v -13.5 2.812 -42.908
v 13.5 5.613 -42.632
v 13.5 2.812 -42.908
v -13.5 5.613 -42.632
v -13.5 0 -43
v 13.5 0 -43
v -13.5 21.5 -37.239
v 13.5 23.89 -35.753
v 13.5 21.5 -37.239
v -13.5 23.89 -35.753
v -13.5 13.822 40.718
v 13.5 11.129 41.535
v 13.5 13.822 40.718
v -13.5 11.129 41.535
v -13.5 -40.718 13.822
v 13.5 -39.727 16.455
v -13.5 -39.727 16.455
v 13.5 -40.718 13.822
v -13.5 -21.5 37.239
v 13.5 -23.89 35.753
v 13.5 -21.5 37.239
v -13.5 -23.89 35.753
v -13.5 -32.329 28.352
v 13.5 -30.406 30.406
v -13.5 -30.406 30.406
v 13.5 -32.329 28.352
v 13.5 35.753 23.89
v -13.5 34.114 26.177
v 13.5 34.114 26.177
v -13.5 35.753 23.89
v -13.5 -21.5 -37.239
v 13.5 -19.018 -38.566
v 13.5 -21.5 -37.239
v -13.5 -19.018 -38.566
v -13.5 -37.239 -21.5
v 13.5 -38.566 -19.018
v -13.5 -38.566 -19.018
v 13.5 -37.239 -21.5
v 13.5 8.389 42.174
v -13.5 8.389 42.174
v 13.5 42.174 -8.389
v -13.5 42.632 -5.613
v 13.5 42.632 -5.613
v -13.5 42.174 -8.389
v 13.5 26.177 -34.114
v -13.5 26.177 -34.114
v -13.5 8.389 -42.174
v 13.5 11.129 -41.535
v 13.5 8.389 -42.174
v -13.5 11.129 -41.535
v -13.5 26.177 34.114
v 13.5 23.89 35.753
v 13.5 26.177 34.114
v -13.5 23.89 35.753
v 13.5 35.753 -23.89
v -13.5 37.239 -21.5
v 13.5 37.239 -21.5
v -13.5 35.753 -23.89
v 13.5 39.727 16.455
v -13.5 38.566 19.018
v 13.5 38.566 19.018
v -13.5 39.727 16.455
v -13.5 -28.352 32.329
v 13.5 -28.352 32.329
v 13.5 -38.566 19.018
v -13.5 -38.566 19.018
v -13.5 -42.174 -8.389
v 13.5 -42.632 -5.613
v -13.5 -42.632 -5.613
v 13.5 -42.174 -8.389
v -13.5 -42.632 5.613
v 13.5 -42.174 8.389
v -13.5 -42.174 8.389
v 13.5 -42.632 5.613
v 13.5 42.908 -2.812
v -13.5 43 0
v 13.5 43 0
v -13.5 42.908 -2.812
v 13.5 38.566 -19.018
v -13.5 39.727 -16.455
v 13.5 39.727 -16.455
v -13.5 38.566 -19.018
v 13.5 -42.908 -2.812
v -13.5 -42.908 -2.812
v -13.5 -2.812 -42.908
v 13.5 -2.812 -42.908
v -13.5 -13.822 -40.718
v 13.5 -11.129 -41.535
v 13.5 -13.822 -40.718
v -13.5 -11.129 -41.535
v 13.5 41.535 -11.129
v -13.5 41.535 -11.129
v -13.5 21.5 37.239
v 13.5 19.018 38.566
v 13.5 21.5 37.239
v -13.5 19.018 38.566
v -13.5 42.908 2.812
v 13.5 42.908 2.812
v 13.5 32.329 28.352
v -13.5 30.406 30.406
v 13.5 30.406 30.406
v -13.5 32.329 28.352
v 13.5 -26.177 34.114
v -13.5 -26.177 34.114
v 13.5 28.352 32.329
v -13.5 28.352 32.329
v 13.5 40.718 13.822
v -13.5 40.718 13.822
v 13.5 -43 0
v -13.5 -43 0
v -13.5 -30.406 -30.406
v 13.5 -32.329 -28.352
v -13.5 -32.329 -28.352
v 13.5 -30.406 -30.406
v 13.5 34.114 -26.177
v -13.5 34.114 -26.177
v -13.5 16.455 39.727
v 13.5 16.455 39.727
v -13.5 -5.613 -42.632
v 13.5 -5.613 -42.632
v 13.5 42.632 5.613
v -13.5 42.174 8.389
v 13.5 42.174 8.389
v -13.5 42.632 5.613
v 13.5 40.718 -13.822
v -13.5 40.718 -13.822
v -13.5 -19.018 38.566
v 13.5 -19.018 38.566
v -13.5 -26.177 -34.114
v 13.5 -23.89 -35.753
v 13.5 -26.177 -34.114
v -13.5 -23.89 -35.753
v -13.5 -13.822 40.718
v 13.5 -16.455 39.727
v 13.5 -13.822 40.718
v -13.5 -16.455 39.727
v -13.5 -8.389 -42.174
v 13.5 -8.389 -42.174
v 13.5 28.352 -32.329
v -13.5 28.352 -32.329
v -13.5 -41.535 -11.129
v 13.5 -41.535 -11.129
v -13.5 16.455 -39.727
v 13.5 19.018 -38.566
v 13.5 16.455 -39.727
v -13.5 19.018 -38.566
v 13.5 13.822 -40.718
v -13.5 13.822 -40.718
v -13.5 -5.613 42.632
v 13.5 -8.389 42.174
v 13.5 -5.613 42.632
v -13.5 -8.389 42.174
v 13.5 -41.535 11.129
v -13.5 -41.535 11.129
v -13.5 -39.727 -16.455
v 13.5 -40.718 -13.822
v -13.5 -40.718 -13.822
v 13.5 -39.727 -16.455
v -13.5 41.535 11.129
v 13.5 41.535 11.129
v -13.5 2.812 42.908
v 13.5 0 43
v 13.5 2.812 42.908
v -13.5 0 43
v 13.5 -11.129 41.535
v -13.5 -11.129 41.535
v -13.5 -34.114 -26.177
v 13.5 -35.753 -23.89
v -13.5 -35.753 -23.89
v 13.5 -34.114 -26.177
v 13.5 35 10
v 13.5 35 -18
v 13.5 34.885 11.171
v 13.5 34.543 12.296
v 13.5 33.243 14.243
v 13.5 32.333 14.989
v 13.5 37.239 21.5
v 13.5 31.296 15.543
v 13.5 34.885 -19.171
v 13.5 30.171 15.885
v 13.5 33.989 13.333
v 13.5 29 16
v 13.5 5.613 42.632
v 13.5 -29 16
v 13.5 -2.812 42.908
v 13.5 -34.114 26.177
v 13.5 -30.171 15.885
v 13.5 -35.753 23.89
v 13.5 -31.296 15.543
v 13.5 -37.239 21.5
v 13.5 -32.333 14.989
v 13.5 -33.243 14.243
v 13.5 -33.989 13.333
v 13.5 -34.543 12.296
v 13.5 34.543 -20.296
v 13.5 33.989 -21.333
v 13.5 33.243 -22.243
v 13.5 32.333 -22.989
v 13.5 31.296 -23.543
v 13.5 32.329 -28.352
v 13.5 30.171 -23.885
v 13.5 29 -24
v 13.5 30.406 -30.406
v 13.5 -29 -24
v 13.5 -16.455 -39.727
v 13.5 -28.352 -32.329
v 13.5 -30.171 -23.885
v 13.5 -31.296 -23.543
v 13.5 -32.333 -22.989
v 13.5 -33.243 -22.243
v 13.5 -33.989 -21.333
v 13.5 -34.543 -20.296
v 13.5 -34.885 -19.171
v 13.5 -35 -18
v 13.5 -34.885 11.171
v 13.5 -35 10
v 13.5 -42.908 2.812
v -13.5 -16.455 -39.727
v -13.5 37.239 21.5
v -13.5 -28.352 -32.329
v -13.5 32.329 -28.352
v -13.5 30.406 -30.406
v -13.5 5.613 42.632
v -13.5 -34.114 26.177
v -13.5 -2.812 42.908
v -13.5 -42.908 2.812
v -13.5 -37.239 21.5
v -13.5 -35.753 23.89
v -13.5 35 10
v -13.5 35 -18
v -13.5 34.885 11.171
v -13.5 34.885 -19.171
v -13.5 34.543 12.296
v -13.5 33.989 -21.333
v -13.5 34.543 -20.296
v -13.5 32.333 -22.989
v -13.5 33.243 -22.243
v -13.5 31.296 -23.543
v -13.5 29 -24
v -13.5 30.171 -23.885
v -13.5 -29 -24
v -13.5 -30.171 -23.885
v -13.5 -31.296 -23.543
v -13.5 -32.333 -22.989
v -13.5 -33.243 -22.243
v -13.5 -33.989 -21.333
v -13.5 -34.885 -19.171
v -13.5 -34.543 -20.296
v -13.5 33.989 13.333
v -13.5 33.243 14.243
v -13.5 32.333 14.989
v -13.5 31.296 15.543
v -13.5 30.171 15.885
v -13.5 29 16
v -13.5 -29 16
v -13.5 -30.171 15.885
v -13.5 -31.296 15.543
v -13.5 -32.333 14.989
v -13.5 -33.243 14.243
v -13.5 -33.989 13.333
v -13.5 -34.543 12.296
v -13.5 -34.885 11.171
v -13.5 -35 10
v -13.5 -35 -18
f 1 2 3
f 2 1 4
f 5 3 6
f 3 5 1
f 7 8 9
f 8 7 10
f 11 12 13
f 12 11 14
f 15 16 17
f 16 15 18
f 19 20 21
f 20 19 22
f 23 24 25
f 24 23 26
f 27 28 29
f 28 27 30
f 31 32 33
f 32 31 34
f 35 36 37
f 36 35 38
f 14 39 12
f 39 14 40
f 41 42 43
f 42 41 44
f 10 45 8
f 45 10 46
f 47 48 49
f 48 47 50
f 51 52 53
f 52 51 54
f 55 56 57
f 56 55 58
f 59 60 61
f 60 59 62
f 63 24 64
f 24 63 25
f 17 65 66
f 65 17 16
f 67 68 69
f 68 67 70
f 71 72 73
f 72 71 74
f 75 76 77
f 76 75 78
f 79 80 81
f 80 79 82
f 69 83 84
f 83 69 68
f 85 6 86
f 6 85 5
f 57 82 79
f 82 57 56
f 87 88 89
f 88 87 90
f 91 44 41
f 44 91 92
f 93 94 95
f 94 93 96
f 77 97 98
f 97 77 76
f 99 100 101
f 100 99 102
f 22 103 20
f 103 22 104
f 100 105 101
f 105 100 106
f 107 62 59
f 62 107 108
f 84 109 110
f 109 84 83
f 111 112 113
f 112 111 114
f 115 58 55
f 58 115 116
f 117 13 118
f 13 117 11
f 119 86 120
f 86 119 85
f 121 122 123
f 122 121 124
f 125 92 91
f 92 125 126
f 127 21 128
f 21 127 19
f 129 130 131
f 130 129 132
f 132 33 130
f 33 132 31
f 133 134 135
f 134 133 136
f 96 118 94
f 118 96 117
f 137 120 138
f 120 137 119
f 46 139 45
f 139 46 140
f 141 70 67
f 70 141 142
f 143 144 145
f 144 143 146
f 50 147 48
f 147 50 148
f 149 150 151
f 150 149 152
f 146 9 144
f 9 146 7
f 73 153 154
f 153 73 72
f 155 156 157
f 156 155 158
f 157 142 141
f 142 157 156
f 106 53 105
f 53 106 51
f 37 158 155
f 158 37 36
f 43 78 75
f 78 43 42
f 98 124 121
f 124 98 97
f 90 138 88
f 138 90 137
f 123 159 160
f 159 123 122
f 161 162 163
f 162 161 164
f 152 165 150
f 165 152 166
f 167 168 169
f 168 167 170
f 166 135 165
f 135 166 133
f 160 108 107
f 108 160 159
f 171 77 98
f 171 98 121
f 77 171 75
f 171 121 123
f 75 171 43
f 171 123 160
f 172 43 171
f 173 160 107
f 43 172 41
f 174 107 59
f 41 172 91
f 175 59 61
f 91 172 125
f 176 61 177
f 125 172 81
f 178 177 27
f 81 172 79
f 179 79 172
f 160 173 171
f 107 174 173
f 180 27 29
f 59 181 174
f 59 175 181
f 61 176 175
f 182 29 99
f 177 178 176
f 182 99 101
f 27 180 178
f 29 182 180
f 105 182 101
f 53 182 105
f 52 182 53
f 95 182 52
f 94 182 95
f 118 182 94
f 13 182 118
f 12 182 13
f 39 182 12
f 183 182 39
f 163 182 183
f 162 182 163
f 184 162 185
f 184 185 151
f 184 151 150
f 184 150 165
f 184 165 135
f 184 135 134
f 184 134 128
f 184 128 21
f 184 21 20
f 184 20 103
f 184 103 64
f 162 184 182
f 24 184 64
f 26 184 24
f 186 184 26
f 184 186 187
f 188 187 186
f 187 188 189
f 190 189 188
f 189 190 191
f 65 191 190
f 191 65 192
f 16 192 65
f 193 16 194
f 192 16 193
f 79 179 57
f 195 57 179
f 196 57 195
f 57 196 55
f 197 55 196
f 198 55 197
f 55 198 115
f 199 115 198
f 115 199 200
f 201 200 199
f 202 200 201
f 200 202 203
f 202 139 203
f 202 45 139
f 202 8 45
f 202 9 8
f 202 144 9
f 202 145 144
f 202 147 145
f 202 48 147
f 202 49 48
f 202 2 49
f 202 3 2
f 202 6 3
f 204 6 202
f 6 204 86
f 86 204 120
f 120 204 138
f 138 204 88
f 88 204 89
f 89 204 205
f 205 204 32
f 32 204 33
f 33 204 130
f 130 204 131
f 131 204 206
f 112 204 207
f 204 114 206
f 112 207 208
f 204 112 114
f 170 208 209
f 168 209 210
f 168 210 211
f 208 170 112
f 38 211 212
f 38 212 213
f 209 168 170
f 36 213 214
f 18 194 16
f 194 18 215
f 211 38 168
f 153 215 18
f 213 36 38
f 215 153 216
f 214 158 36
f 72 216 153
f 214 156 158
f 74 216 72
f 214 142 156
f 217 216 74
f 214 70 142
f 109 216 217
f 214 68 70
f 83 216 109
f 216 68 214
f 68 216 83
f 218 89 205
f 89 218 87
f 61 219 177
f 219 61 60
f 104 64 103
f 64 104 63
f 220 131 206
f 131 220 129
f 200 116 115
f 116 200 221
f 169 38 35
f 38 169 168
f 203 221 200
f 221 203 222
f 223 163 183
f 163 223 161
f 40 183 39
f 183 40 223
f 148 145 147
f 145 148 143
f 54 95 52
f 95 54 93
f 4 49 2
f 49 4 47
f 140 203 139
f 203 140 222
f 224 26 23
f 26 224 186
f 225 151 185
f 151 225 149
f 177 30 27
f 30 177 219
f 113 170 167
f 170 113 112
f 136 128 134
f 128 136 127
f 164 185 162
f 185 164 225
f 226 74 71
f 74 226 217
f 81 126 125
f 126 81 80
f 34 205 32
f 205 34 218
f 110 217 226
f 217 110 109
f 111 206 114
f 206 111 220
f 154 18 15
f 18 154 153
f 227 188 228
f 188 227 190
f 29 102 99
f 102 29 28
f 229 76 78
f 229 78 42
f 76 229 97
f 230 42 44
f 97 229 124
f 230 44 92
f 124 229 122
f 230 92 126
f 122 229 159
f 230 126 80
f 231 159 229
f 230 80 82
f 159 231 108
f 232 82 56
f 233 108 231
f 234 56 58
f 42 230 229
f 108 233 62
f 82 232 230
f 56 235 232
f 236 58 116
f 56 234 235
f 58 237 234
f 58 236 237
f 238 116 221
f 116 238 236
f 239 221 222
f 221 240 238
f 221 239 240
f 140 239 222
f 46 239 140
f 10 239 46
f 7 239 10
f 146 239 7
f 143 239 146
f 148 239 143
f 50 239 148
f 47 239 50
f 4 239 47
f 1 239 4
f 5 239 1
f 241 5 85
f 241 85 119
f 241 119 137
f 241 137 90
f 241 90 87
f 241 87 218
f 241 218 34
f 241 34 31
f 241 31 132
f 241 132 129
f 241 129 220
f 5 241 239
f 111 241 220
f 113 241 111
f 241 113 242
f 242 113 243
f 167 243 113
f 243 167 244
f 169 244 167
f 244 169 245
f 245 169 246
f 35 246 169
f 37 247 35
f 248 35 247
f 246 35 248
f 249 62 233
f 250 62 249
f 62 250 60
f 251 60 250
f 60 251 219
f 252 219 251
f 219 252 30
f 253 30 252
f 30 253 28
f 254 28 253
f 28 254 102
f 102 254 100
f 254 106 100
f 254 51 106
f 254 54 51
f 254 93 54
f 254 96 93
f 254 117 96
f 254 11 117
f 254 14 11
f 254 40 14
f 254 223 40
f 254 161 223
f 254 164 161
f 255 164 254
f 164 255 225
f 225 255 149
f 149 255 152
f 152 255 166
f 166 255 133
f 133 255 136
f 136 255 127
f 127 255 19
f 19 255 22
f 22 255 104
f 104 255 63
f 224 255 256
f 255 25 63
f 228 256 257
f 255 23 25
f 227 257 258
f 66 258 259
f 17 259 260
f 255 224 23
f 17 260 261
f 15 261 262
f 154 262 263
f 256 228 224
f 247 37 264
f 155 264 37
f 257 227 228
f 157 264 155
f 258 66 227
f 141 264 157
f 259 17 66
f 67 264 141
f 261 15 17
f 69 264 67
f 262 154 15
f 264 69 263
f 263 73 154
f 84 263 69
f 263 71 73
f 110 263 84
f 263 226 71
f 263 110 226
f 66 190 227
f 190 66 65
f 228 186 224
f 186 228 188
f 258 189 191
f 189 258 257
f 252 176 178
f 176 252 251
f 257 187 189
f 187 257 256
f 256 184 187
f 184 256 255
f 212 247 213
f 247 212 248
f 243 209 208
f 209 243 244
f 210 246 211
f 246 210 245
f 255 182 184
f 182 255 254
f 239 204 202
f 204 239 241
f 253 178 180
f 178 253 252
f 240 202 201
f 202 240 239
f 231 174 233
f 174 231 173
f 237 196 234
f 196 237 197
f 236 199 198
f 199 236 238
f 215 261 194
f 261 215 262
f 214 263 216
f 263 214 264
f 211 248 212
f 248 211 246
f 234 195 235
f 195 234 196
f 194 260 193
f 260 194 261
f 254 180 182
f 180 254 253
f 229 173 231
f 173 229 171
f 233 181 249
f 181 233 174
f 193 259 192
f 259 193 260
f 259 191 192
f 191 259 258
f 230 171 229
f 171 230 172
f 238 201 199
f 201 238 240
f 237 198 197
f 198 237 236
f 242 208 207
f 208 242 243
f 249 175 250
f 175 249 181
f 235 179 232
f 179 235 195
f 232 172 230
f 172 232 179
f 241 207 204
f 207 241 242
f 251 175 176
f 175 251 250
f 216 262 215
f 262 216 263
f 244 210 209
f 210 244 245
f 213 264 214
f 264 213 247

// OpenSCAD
// file: params.scad
// SEA:CUT / Friendly Floatee drifter — shared parameters (mm)
// Hardware: CERN-OHL-S v2 (strongly reciprocal). Docs: CC BY-SA 4.0. Firmware: MIT.
// MEASURE YOUR OWN BOTTLE and edit these. Defaults approximate a 1 L round PET bottle.

// --- bottle (upcycled PET) ---
bottle_id = 90;            // bottle inner diameter
bottle_r  = bottle_id / 2; // derived inner radius

// --- printing ---
wall = 2.4;                // printed wall thickness
clr  = 0.4;                // fit clearance
$fn  = 64;                 // curve smoothness

// --- LILYGO T-A7670G board (approximate, incl. headers) ---
board_l = 68;
board_w = 34;
board_h = 12;

// --- 18650 protected cell ---
cell_d = 18.6;
cell_l = 68;

// --- lead-free ballast pocket (self-righting weight) ---
ballast_l = 55;
ballast_w = 22;

// --- flotation & hydrostatics (NEW; estimates — verify per build; see hardware/RELIABILITY.md) ---
// Sealed 1 L bottle displaces ~1000 cm^3 -> reserve ratio ~4.83x (never sinks intact).
// Real failure = seal leak -> flooded net buoyancy ~ -97 gf -> sinks. Foam reverses it.
foam_vol             = 160;   // cm^3 closed-cell foam (flooded reserve; non-BOM NEW part)
foam_density         = 0.04;  // g/cm^3 EVA/EPE estimate (range 0.03-0.05)
reserve_ratio_target = 1.25;  // flooded: (disp/mass) >= this  (PASS >= 1.20)
sealed_reserve_min   = 3.0;   // sealed: 1000cm3/mass >= this (design ~4.83)
freeboard_min        = 30;    // mm minimum calm-water freeboard
ballast_mass_g       = 40;    // tuning var; +10 g ballast needs +~11.7 cm^3 foam
// foam collar geometry (NEW part, cut/heat-formed EVA sheet — .scad is the cut master)
foam_od     = 86;             // mm, fits inside bottle_id=90 with margin
foam_bore_l = board_l + 2;    // ~70 mm payload channel (board_l=68)
foam_bore_w = board_w + 6;    // ~40 mm (board_w=34)
foam_area   = PI*pow(foam_od/2,2)/100 - (foam_bore_l*foam_bore_w)/100; // ~30.1 cm^2
foam_collar_h = foam_vol / foam_area;   // ~53 mm; split into 2 x ~27 mm
// prints: measured STL solid volume = 56.9 cm^3 (bracket 40.4 + keel 9.95 + loop 6.57)
print_infill_max = 0.60;  // keep <=60% -> foam_vol 160 holds; solid(100%) needs ~175

// --- full assembly (real size; visual mocks measure YOUR parts) ---
collar_t   = 27;          // foam collar thickness (2 pieces = foam_collar_h ~53)
collar_x   = 44.5;        // collar center offset +-X (clears keel ends at +-29.9)
bottle_body_l = 190;      // straight body length of a ~1 L bottle (mock)
bottle_body_x0 = -100;    // body from x0 to x0+bottle_body_l; neck/cap at +X
shoulder_l = 22;          // taper body -> neck
neck_l     = 18;          // neck + cap
cap_d      = 31;          // cap outer diameter

// ============================================================
//  Tier 1.5 SOLAR VARIANT — parameters (NEW; every value an ESTIMATE -> bench-verify)
//  Anchors: buoyancy=RELIABILITY §4 (density-aware) · RF=FLOAT_STANDARD B5
//           self-right "T7" = VERIFIED_BUILD_TEST T4 re-run with the solar payload installed
//  Kernels enforced here: NO new printed part · ballast 40 g UNCHANGED ·
//                         non-metal cells only · solar = power != coverage
// ------------------------------------------------------------
solar_enable = 0;          // 0 = plain Tier 1 (default). Solar build: set 1 or render -D solar_enable=1.
                           // ★SHORT-RECOVERY MISSIONS keep 0 (ELECTRONICS_POWER §3: solar = net loss).

bl_ref = board_l + 2*wall + 2*clr;                 // 73.6 (bracket len; ribs at +-bl_ref*0.35 = +-25.76)

// --- added-mass budget (★MEASURE; lens estimates diverge 20-45 g) ---
solar_added_mass_g = 39;   // PLANNING nominal (film 10-25 + ctrl 5-8 + wire 3-4 + vent ~2 + adhesive 3-8)
solar_add_rho      = 1.64; // g/cm^3 EFFECTIVE (film~1.65 · PCB~1.9 · wire~1.5 · adhesive~1.0)
solar_second_cell  = 0;    // 1 => +~56 g (48 cell + 8 mount), BELLY only, matched cells + isolation diode (F2/T7 re-pass)
solar_added_mass_eff = solar_added_mass_g + (solar_second_cell ? 56 : 0);  // effective Δm fed to foam sizing

// --- density-aware foam re-size (★NOT the ballast 11.7 cm^3/10g; panel is low-density) ---
solar_foam_coeff = (1.25 - 1/solar_add_rho)/(1 - 1.25*foam_density)*10;  // ~6.7 cm^3 / 10 g
foam_vol_solar   = foam_vol + solar_foam_coeff*(solar_added_mass_eff/10);  // ~186 cm^3 @ 39 g (2nd cell => ~224)
collar_t_solar   = foam_vol_solar/foam_area*10/2;                        // ~31 mm each (2 collars); assembly/export use this

// --- wrap bands (★NOT printed: laminated film + marine adhesive on the body) ---
solar_wrap_od = bottle_id + 2;   // body OD (MEASURE yours)
solar_wrap_r  = solar_wrap_od/2;
solar_film_t  = 0.8;             // laminated film thickness (fit/collision + RF-window viz ONLY)
solar_band_n  = 2;
solar_band_w  = 44;              // axial band width
solar_band_gap= 34;              // central channel >= recovery-loop base 30 (loop + QR stay bare)
solar_band_x  = [ for (i=[0:solar_band_n-1])
                  (solar_band_n==1) ? 0 : (i-(solar_band_n-1)/2)*(solar_band_w+solar_band_gap) ]; // +-39

// --- RF keep-out (★REAL gate = non-metal substrate; the film window is secondary insurance) ---
solar_cell_substrate = "nonmetal"; // HARD GATE: a-Si / polyimide ONLY. "metal" => ABORT (B5; verify T6)
solar_rf_x0 = -50; solar_rf_x1 = 48;  // antenna x-range (doc only; the window currently cuts the full band length)
solar_rf_deg = 120;                   // top +Z sector kept FILM-FREE (cut across the whole band = conservative)

// --- charge path (★default EXTERNAL low-Iq linear -> BATTERY terminal; NOT onboard-direct) ---
solar_ctrl_mode = "linear";  // "linear"=CN3065-class low-Iq (DEFAULT) | "mppt"=CN3791-class (clean sites)
solar_ctrl_l=26; solar_ctrl_w=19; solar_ctrl_h=7;   // COTS envelope (CG viz only), zip-tied to bracket rib
solar_ctrl_x = -bl_ref*0.35;  // -25.76 : on the -X bracket locating rib
solar_ctrl_z = -2;            // just below centreline, BESIDE the cell holder (keep CG low -> T7)

// --- low-temp cutoff (★MANDATORY on ALL modes — HARDWARE latch, not firmware) ---
solar_ntc = "10k_B3435_cell_bonded";  // JEITA: <0C stop · 0-10C taper · >45C stop (epoxy to cell can)

// --- wiring: REUSE the resealed-seam grommet (assembly §3-0) — NO NEW HOLE; re-pass T1 ---
solar_wire_od = 3.0;
// --- vent: Gore-Tex ePTFE ADHESIVE PATCH on the cap (NOT a printed boss) ---
solar_vent_patch_d = 19;

// ★HARD GATE (FLOAT_STANDARD B5) — makes the "metal => ABORT" claim TRUE in code, not just prose.
//   Any file that includes params.scad aborts if a metal-backed cell substrate is selected.
assert(solar_cell_substrate != "metal",
       "B5: metal-backed solar cells shield the antennas (RF death) + are toxic -> ABORT. Use a-Si (ETFE) or Cd-free CIGS (polyimide).");
// main file
// Friendly Floaty — foam collar (flooded-reserve primary buoyancy)
// The part that keeps a FLOODED unit afloat (RELIABILITY.md §4: 2 collars = ~160 cm^3
// closed-cell EVA/EPE -> +27.5% flooded reserve). NOT 3D-printed: this model is the
// CUT MASTER for EVA sheet stacking/heat-forming (print once as a template if useful).
// Axes: X = bottle long axis. Payload channel W70(Y) x H40(Z), centered 4 mm low so the
// bracket tray + cell holder pass through; the keel passes under via the channel.
include <params.scad>

module _rrect(w_z, w_y, r) {
    // rounded rect in the local XY plane of the rotated frame:
    // local x -> global -Z (height w_z), local y -> global Y (width w_y)
    hull() for (x = [-w_z/2 + r, w_z/2 - r]) for (y = [-w_y/2 + r, w_y/2 - r])
        translate([x, y]) circle(r = r, $fn = 32);
}

// t = collar thickness (mm). Default = base Tier-1 (collar_t=27). Solar build passes collar_t_solar (~31).
module foam_collar(t = collar_t) {
    rotate([0, 90, 0]) difference() {
        cylinder(h = t, d = foam_od, center = true, $fn = 96);
        // payload channel, centered 4 mm below the bottle axis (local +x = global -Z)
        translate([4, 0, 0])
            linear_extrude(t + 2, center = true)
                _rrect(foam_bore_w, foam_bore_l, 6);
    }
}

foam_collar();
